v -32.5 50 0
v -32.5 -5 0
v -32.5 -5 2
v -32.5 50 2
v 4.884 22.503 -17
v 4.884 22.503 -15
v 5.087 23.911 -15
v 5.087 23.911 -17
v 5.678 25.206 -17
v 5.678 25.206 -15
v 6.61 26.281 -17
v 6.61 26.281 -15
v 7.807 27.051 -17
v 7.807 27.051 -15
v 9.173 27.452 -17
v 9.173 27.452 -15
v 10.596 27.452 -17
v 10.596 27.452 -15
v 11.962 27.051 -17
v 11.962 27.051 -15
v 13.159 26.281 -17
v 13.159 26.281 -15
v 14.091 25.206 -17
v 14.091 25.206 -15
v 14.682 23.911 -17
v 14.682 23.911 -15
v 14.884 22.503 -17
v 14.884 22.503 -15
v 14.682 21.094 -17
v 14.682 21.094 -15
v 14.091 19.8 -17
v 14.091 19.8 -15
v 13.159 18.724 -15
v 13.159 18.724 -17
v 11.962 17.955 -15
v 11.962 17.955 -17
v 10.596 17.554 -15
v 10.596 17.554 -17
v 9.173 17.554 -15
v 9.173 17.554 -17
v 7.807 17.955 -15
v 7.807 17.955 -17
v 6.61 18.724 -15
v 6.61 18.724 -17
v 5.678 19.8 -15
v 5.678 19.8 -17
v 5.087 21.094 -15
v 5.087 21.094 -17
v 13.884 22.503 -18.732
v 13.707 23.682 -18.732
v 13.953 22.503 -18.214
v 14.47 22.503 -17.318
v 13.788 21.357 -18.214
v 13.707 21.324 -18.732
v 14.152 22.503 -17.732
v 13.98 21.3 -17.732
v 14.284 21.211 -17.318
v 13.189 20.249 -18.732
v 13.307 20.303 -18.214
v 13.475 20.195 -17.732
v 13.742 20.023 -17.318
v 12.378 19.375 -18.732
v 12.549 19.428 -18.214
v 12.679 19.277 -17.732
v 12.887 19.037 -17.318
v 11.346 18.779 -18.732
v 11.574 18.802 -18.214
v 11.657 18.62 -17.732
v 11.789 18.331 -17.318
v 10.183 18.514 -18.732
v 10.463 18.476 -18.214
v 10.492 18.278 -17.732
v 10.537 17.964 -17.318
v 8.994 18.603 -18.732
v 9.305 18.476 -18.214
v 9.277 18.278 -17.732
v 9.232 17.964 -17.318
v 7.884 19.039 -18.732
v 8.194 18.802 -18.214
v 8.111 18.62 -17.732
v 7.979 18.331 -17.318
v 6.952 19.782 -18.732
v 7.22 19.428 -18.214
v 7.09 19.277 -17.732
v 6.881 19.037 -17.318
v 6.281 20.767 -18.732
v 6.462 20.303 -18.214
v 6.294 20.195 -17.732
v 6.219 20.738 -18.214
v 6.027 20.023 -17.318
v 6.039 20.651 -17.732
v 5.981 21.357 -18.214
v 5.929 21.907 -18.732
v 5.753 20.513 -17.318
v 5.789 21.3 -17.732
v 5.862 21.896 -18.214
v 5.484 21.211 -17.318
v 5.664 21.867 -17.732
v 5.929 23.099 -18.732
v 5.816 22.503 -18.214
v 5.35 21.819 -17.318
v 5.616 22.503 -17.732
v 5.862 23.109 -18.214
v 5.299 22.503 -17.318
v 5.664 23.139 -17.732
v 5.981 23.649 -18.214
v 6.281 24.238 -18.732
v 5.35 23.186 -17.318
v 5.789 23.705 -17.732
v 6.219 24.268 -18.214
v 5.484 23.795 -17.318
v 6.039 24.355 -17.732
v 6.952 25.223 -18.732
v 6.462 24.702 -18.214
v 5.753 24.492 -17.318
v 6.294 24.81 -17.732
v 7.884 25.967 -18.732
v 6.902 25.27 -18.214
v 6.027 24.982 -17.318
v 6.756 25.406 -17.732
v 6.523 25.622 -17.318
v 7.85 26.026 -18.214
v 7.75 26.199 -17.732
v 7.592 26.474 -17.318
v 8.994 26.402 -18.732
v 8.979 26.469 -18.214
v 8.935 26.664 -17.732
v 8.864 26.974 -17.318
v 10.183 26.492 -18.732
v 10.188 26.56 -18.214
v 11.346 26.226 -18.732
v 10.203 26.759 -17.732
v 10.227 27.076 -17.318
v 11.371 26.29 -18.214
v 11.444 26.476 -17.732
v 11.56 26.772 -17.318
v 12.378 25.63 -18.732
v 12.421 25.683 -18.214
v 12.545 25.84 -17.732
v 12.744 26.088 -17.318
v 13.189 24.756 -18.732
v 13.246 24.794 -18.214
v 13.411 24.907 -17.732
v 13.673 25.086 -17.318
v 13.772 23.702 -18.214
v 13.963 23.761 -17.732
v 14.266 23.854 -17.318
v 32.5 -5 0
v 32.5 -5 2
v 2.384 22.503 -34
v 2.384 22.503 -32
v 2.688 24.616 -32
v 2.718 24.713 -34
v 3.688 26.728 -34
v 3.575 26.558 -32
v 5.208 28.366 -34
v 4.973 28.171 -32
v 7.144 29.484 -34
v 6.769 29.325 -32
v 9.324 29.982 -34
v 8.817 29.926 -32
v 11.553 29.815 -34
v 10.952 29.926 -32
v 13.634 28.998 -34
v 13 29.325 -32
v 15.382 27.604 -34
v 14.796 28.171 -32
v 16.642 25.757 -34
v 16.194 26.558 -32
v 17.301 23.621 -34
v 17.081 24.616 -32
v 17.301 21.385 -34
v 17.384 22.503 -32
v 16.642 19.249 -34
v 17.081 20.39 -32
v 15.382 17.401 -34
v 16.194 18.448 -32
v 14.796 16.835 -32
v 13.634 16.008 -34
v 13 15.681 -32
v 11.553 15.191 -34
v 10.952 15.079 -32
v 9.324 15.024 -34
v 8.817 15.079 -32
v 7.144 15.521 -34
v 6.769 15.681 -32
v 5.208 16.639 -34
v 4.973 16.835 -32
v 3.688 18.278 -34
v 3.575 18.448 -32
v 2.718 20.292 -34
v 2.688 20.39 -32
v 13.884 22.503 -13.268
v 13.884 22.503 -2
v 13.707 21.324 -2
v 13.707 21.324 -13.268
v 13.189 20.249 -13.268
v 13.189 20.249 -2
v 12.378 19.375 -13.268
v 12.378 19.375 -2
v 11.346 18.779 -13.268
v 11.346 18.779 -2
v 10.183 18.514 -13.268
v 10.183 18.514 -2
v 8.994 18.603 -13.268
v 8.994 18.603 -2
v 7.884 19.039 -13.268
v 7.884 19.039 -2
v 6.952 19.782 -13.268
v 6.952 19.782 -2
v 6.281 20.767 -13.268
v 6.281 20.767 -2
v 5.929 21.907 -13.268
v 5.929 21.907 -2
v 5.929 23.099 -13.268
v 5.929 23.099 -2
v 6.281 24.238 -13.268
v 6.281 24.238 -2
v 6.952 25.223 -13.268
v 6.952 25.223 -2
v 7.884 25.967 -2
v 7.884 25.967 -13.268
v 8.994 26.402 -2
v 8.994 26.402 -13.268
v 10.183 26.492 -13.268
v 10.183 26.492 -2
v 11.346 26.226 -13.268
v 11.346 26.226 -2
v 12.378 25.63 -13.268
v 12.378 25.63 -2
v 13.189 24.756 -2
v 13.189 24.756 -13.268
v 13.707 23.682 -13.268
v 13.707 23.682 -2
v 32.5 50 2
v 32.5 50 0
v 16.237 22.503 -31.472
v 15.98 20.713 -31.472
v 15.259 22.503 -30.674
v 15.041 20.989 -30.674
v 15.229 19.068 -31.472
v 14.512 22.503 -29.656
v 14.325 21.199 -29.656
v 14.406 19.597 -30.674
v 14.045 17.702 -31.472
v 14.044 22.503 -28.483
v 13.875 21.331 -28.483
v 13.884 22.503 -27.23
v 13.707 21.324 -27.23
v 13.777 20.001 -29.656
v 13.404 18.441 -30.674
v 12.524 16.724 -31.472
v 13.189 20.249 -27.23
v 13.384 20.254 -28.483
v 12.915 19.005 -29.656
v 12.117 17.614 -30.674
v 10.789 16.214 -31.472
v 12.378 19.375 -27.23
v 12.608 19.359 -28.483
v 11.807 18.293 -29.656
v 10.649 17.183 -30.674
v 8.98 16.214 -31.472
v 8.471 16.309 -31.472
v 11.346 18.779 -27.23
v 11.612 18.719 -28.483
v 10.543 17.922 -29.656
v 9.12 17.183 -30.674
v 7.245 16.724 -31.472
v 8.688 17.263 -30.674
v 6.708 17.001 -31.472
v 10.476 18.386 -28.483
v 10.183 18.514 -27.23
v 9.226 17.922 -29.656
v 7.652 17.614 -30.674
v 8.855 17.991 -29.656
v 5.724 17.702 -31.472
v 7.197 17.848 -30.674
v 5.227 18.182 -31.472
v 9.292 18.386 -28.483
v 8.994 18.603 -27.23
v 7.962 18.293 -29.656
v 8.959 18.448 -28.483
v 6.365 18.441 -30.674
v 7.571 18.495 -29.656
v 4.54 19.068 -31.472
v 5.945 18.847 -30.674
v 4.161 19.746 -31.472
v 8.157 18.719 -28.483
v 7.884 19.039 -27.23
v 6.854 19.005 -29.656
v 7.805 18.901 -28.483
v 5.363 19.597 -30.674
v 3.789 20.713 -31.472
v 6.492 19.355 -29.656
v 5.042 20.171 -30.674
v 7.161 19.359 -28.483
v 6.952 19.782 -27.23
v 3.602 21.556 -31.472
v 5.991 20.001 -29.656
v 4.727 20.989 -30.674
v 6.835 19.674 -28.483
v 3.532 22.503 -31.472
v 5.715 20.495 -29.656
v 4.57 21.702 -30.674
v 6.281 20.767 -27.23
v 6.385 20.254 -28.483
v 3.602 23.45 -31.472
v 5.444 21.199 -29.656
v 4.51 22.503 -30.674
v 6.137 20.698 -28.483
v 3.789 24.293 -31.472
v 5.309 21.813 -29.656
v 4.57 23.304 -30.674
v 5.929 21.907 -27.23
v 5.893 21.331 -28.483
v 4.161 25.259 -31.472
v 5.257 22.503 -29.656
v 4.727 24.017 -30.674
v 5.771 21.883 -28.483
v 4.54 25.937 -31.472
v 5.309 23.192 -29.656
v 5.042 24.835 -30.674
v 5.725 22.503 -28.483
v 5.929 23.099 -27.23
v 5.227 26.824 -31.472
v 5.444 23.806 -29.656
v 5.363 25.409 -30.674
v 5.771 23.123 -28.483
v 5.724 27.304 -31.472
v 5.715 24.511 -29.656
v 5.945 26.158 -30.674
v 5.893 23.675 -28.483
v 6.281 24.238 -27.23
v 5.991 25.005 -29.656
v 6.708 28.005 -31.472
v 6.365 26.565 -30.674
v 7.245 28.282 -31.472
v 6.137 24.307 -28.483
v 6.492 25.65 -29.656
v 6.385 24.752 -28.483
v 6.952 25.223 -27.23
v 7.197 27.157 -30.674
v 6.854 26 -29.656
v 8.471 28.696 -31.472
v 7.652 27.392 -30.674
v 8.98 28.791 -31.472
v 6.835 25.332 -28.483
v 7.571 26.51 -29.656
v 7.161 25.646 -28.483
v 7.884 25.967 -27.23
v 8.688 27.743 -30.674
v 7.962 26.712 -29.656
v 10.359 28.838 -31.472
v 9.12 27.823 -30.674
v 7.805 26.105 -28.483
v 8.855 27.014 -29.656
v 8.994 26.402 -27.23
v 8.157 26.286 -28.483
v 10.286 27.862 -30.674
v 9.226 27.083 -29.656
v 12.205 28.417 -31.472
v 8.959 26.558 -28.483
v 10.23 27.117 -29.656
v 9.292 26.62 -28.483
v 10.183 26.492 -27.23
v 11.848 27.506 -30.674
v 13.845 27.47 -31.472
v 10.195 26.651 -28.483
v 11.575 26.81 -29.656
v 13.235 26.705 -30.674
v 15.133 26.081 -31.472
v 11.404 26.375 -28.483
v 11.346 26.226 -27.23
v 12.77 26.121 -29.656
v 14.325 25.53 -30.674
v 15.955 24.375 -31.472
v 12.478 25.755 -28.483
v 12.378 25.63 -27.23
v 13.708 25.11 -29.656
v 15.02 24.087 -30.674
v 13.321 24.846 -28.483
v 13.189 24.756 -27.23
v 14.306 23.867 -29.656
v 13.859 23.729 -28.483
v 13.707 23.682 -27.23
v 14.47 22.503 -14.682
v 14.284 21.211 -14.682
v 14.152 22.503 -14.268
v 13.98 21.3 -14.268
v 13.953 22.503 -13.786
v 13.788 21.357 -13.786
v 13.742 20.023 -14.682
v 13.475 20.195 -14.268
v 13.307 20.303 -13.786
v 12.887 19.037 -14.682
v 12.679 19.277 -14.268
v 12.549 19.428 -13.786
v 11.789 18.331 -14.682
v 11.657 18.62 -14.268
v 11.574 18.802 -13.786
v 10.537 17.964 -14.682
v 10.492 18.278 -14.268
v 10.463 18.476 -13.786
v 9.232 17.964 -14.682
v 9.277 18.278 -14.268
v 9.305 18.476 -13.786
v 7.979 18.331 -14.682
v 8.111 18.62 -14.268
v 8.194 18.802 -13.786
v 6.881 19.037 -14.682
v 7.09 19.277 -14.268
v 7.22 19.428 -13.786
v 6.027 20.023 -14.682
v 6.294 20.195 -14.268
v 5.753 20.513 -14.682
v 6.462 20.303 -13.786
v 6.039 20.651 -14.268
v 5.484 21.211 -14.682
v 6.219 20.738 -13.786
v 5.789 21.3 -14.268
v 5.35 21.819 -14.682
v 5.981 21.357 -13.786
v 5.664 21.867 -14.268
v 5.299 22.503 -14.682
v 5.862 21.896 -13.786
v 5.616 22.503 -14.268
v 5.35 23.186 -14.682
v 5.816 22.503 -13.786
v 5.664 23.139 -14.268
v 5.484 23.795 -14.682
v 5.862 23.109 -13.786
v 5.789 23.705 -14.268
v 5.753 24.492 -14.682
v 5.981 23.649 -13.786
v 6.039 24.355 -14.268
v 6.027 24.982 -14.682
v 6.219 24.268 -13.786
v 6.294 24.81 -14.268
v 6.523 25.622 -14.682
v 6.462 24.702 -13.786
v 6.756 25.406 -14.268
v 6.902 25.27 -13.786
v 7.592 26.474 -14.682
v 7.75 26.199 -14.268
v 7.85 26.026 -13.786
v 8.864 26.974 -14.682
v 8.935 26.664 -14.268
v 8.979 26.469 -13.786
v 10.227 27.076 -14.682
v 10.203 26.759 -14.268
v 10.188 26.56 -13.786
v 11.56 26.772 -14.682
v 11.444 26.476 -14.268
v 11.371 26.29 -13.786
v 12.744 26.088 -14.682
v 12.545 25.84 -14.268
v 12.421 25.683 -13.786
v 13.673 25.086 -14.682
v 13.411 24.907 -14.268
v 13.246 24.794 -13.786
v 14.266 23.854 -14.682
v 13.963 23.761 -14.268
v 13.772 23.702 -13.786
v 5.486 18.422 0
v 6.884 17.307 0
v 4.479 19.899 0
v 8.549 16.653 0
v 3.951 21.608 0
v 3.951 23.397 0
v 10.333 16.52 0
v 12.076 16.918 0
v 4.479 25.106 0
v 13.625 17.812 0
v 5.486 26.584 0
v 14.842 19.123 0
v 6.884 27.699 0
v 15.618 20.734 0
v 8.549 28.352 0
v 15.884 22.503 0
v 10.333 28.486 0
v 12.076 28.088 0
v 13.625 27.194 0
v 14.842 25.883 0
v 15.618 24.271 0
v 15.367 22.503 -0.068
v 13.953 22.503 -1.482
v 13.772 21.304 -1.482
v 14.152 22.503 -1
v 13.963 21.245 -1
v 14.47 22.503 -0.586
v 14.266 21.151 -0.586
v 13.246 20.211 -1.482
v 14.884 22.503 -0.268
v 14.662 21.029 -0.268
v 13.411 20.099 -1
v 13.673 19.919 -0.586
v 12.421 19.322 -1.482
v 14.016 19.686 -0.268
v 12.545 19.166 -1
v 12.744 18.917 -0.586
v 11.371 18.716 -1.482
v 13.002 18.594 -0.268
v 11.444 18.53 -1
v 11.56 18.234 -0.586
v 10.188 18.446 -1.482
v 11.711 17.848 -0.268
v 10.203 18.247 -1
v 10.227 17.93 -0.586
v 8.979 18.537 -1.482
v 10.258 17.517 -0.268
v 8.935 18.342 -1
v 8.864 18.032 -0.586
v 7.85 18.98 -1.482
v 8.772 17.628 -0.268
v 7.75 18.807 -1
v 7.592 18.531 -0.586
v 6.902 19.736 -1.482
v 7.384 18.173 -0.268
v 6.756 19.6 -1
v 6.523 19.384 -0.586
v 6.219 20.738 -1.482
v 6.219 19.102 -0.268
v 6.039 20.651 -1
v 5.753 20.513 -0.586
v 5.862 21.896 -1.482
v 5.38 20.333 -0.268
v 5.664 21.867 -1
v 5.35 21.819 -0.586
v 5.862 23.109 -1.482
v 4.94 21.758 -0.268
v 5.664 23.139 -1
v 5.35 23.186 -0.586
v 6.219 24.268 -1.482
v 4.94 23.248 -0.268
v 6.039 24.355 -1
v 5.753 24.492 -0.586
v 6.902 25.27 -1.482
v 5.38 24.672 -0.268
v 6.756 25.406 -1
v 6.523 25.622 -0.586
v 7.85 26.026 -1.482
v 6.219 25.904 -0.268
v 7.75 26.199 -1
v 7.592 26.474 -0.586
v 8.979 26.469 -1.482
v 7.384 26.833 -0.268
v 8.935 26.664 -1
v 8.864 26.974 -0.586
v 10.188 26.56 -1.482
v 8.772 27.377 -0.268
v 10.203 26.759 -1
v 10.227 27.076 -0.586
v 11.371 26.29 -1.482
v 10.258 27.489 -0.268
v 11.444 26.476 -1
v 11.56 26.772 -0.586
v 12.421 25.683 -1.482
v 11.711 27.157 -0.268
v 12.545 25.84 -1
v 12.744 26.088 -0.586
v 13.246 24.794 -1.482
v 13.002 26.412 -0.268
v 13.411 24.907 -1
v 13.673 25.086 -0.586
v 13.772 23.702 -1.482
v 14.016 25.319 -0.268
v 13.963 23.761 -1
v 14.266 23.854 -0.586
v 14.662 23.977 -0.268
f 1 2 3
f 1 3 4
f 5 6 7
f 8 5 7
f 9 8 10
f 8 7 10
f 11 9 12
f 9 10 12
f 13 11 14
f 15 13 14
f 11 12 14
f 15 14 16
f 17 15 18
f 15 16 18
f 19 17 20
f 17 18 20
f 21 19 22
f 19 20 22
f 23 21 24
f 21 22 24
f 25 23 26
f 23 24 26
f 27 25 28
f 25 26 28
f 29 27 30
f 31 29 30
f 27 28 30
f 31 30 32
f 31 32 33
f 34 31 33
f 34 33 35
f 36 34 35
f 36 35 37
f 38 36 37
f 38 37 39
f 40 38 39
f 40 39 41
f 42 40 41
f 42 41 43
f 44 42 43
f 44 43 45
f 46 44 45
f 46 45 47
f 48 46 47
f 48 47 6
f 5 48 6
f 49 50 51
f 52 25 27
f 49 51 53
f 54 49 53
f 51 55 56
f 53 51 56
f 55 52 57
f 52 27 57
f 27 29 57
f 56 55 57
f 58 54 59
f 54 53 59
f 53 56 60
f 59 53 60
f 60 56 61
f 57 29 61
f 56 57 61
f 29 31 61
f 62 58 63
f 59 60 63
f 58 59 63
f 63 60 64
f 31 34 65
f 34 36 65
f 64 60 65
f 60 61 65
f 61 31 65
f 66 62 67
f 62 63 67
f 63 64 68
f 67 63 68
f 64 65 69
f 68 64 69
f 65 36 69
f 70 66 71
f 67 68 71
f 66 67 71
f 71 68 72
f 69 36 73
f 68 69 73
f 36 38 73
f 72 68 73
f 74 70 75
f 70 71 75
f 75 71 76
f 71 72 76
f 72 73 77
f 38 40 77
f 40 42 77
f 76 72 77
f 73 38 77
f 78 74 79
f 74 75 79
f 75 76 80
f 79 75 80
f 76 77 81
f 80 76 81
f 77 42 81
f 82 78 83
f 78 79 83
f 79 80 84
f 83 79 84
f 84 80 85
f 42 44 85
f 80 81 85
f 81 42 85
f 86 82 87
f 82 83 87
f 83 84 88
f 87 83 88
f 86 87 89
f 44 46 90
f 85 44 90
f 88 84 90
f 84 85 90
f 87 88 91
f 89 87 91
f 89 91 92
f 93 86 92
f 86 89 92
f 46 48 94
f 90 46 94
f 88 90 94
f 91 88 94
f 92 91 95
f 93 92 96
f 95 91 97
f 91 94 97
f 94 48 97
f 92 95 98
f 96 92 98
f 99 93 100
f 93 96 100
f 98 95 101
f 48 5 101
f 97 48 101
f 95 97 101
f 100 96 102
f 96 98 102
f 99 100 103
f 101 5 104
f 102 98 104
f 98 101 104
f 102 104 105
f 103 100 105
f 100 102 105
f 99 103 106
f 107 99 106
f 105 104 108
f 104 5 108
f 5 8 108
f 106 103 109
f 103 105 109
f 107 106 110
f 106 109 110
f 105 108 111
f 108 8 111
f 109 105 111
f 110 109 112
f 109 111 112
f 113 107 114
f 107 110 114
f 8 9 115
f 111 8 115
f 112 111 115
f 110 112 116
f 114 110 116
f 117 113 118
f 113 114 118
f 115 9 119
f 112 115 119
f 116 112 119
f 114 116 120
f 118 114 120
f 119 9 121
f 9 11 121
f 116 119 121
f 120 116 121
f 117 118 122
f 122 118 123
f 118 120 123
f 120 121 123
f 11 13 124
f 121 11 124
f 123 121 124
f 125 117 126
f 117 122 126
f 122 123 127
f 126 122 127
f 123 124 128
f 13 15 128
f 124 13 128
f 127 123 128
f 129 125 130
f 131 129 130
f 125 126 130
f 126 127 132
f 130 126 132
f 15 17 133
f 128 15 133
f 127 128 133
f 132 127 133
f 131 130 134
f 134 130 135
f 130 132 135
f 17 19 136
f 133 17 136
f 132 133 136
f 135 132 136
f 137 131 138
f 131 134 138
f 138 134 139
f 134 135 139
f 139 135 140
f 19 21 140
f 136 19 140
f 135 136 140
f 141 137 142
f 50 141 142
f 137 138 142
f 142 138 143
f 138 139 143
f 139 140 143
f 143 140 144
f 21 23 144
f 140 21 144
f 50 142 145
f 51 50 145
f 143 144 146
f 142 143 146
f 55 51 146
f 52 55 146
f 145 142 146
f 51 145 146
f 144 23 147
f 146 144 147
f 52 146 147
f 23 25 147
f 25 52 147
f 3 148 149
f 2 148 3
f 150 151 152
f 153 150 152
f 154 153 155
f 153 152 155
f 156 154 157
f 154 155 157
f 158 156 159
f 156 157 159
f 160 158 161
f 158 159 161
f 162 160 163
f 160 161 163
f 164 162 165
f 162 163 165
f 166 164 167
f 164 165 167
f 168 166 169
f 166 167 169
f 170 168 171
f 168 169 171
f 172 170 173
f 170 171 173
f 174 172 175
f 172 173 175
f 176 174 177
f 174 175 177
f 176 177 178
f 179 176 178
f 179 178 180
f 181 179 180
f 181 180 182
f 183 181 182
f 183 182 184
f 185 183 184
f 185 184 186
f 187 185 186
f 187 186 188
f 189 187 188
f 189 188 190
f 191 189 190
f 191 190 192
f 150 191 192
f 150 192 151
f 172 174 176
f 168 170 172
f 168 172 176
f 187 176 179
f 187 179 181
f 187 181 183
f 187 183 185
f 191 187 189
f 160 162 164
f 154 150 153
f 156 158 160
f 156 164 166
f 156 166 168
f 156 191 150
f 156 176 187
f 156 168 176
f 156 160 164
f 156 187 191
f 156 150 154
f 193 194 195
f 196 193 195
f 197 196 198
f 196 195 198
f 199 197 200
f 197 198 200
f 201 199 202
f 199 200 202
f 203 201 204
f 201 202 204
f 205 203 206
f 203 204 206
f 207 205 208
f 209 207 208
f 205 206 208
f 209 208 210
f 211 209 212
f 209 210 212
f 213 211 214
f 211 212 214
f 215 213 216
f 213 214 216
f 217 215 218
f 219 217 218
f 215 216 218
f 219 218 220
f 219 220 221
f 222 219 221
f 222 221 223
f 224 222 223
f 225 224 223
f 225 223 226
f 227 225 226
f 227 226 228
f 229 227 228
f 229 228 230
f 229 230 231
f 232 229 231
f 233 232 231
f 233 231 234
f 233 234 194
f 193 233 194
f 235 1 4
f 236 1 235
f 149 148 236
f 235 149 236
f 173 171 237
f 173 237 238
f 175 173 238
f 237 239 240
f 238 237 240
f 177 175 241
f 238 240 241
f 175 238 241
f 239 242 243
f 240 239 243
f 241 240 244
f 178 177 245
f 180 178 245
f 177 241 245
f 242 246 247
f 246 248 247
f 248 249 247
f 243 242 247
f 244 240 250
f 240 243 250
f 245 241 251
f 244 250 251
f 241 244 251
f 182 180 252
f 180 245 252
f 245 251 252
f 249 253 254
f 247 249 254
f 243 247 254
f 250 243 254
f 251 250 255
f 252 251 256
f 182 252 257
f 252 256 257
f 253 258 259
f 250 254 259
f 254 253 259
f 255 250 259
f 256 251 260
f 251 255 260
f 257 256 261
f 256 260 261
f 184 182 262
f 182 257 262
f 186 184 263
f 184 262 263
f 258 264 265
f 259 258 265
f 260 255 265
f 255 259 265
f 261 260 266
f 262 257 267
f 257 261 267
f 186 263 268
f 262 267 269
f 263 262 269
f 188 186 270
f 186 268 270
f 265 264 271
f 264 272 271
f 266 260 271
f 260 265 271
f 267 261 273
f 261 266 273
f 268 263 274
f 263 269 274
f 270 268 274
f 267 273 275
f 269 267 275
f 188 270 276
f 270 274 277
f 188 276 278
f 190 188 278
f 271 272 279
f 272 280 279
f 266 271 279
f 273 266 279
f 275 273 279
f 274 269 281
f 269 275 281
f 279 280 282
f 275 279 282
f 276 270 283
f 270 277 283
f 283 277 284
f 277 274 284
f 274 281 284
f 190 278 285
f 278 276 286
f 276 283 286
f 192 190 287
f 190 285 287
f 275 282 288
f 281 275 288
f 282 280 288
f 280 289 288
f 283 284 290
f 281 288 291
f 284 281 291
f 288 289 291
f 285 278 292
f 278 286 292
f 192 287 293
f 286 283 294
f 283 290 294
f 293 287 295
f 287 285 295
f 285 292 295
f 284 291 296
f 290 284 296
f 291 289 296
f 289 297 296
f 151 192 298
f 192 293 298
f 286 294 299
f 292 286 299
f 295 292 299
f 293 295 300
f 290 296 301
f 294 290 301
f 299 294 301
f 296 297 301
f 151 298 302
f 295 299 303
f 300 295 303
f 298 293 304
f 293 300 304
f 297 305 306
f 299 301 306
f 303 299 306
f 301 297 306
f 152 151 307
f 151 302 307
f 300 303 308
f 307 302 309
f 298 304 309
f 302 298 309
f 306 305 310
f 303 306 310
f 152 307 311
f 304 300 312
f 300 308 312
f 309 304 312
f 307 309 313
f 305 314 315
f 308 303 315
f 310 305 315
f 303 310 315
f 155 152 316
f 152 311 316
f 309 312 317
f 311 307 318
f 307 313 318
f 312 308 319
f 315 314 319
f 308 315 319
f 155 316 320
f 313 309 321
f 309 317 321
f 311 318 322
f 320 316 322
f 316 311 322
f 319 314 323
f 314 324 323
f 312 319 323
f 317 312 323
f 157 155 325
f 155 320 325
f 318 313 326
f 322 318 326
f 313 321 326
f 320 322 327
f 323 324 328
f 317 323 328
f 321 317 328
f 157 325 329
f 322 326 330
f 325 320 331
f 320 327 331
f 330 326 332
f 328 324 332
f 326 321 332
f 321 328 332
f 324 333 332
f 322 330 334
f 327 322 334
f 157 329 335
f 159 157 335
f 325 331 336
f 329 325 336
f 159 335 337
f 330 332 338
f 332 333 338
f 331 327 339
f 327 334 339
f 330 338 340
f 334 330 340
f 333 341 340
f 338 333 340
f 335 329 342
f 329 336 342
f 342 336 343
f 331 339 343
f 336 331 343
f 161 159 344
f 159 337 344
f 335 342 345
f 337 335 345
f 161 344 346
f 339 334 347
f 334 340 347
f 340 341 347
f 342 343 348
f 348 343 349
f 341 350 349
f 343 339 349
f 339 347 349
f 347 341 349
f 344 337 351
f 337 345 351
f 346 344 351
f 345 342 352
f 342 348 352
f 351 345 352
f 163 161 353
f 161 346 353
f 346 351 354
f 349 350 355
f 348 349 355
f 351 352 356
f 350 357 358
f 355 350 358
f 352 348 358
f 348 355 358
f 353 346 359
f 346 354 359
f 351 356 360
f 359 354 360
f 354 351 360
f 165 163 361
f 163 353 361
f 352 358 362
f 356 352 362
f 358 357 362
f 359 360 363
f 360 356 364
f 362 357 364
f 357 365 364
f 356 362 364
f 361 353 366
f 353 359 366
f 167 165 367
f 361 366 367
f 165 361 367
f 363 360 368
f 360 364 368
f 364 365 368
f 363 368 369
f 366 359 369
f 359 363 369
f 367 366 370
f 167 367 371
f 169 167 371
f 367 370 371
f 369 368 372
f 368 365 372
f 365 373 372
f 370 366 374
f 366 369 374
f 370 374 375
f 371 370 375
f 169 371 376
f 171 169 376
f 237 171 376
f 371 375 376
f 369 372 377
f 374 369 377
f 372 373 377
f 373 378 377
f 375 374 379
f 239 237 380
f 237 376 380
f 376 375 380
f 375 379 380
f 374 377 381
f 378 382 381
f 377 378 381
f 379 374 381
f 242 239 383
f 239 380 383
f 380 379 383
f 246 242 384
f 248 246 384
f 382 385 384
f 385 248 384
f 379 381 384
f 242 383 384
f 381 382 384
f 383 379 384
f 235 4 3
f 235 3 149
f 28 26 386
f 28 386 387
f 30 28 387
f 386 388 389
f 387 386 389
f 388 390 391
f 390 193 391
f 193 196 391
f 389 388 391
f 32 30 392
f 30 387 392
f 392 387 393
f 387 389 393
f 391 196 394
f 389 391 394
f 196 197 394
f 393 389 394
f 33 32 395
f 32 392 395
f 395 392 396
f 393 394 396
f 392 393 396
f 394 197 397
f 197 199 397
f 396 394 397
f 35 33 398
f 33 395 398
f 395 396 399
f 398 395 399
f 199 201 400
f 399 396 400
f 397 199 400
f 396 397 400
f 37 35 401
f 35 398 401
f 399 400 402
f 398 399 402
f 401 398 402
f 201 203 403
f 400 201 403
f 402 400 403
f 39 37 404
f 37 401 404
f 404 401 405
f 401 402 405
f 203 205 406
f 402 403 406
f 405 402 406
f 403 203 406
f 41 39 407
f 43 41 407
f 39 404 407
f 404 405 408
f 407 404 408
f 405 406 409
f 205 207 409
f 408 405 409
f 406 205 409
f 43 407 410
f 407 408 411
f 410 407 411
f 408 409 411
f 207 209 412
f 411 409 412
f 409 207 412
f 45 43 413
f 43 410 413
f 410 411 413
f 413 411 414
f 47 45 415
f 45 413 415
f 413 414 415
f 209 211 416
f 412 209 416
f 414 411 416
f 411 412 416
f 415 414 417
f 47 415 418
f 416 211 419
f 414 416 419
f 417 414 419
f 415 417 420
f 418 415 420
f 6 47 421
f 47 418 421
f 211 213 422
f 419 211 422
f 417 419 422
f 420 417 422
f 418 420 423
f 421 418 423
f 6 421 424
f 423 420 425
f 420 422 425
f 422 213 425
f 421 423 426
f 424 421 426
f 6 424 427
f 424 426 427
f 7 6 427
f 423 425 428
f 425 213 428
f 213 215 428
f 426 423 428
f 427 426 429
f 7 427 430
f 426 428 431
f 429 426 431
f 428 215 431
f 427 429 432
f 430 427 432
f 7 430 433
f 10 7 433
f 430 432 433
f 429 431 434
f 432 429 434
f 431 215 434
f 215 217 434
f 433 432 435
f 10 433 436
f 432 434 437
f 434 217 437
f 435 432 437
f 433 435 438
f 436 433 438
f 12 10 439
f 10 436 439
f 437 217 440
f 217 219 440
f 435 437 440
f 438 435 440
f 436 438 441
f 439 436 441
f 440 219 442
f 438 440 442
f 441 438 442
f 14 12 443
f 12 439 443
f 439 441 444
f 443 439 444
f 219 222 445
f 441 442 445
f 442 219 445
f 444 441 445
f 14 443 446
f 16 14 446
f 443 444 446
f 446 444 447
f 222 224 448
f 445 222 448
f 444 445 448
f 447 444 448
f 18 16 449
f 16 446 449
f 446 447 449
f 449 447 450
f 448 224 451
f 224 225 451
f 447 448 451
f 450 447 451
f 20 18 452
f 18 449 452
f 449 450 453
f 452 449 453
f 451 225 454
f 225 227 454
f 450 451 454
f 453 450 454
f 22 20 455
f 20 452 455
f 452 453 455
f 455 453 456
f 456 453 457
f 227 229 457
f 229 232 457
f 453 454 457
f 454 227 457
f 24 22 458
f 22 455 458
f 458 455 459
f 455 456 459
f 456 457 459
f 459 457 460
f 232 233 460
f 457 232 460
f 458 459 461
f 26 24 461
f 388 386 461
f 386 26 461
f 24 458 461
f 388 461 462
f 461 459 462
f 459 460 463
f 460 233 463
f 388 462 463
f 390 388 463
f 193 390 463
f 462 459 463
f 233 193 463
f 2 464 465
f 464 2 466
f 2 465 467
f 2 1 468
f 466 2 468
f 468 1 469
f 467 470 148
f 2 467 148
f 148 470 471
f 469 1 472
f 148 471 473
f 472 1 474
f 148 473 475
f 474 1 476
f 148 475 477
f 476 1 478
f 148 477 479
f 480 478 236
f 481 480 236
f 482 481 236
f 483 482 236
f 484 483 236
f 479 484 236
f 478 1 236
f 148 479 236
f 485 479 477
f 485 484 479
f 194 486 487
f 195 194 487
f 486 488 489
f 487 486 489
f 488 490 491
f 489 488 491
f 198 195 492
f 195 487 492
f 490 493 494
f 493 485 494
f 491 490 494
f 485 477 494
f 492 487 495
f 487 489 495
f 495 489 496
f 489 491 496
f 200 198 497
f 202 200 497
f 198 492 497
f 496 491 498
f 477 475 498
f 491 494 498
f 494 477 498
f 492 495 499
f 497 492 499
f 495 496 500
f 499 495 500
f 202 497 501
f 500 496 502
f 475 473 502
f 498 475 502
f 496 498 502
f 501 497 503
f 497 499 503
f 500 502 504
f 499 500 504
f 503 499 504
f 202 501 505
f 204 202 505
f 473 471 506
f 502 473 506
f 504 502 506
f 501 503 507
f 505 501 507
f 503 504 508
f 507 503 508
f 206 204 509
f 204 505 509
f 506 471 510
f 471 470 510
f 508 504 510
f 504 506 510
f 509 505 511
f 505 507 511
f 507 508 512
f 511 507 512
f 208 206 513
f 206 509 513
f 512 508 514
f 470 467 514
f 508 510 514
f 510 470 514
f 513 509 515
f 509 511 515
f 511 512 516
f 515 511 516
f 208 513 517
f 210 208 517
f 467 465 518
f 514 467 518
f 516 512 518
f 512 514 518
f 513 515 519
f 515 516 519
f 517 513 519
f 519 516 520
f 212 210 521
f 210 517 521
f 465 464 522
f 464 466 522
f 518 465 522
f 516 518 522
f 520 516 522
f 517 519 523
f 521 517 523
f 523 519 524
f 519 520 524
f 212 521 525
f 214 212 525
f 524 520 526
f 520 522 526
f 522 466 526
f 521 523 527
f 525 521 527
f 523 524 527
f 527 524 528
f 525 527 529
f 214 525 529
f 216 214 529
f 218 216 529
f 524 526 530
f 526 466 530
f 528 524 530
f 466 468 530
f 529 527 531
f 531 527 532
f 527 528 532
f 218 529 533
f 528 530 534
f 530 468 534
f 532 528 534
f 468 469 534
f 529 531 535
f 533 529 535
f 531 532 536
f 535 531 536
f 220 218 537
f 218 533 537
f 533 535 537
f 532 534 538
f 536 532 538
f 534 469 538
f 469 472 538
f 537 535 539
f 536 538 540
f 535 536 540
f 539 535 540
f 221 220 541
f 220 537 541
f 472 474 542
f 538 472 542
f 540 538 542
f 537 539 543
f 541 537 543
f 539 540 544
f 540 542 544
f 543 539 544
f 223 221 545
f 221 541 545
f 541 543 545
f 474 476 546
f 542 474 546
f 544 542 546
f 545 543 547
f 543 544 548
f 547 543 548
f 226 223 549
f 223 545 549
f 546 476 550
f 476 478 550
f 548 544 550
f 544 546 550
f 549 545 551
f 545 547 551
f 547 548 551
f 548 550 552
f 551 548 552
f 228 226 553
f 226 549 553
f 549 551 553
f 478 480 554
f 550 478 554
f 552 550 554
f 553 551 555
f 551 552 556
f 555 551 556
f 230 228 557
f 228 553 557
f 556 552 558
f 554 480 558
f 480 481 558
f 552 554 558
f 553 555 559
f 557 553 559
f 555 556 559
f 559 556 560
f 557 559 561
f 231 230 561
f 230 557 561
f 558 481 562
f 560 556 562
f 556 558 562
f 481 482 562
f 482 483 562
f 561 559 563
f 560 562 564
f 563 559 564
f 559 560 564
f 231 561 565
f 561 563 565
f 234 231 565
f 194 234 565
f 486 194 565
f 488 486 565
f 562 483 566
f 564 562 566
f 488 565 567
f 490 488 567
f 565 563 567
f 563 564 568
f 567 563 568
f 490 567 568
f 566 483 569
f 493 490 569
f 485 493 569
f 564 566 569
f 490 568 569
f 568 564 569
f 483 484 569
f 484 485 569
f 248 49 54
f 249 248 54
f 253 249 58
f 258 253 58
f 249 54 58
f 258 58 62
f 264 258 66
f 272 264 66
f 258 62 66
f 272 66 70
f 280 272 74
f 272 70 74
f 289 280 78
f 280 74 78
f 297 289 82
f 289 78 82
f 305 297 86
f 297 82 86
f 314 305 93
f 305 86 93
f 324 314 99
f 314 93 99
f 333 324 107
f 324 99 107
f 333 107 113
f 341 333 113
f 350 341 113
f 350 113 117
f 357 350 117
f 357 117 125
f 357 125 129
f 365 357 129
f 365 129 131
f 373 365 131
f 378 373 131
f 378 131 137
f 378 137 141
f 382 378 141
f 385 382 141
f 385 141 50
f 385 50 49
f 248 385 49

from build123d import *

# Parameters (mm, degrees)
SKIZZE2_W                       = 65
SKIZZE2_H                       = 100
AUFSATZ_LINEAR_AUSTRAGEN1_DEPTH = 2
SKIZZE3_R                       = 4
AUFSATZ_LINEAR_AUSTRAGEN2_DEPTH = 15
SKIZZE4_R                       = 5
AUFSATZ_LINEAR_AUSTRAGEN3_DEPTH = 2
SKIZZE5_R                       = 4
AUFSATZ_LINEAR_AUSTRAGEN4_DEPTH = 15
SKIZZE6_R                       = 7.5
AUFSATZ_LINEAR_AUSTRAGEN5_DEPTH = 2
VERRUNDUNG1_R                   = 2
VERRUNDUNG2_R                   = 2
VERRUNDUNG3_R                   = 5
SKIZZE7_W                       = 65
SKIZZE7_H                       = 45
SCHNITT_LINEAR_AUSTRAGEN1_DEPTH = 2
VERRUNDUNG4_R                   = 2


with BuildPart() as part:
    # Skizze2 → Aufsatz-Linear austragen1 (new body)
    with BuildSketch(Plane.XY):
        Rectangle(SKIZZE2_W, SKIZZE2_H)
    extrude(amount=AUFSATZ_LINEAR_AUSTRAGEN1_DEPTH)

    # Skizze3 → Aufsatz-Linear austragen2 (add)
    with BuildSketch(Plane(origin=(9.884440789, -5.646814133, 0), x_dir=(-1, 0, 0), z_dir=(0, 0, -1))):
        with Locations(Location((0, 28.149559508, 0), (0, 0, 180))):
            Circle(SKIZZE3_R)
    extrude(amount=AUFSATZ_LINEAR_AUSTRAGEN2_DEPTH)

    # Skizze4 → Aufsatz-Linear austragen3 (add)
    with BuildSketch(Plane(origin=(9.884440789, -5.646814133, -15), x_dir=(-1, 0, 0), z_dir=(0, 0, -1))):
        with Locations((0, 28.149559508)):
            Circle(SKIZZE4_R)
    extrude(amount=AUFSATZ_LINEAR_AUSTRAGEN3_DEPTH)

    # Skizze5 → Aufsatz-Linear austragen4 (add)
    with BuildSketch(Plane(origin=(9.884440789, -5.646814133, -17), x_dir=(-1, 0, 0), z_dir=(0, 0, -1))):
        with Locations(Location((0, 28.149559508, 0), (0, 0, 180))):
            Circle(SKIZZE5_R)
    extrude(amount=AUFSATZ_LINEAR_AUSTRAGEN4_DEPTH)

    # Skizze6 → Aufsatz-Linear austragen5 (add)
    with BuildSketch(Plane(origin=(9.884440789, -5.646814133, -32), x_dir=(-1, 0, 0), z_dir=(0, 0, -1))):
        with Locations((0, 28.149559508)):
            Circle(SKIZZE6_R)
    extrude(amount=AUFSATZ_LINEAR_AUSTRAGEN5_DEPTH)

    # Verrundung1
    # the kernel refuses this fillet: 2 mm, written as the material it adds along each edge
    with BuildSketch(Plane(origin=(9.884440789, 22.502745375, -15), x_dir=(1, 0, 0), z_dir=(0, 1, 0))) as verrundung1_piece_1:
        with BuildLine():
            CenterArc((6, -1.732050808), VERRUNDUNG1_R, 120, 60)
            Line((4, -1.732050808), (3.96, -1.732050808))
            Line((3.96, -1.732050808), (3.96, 0))
            Line((3.96, 0), (4, 0.04))
            ThreePointArc((4, 0.04), (4.5, 0.04), (4.98, 0.034641016))
            Line((4.98, 0.034641016), (5, 0))
        make_face()
    revolve(axis=Axis((9.884440789, 22.502745375, -15), (0, 0, -1)))

    # Verrundung2
    # the kernel refuses this fillet: 2 mm, written as the material it adds along each edge
    with BuildSketch(Plane(origin=(9.884440789, 22.502745375, -17), x_dir=(1, 0, 0), z_dir=(0, 1, 0))) as verrundung2_piece_1:
        with BuildLine():
            CenterArc((6, 1.732050808), VERRUNDUNG2_R, 180, 60)
            Line((4, 1.732050808), (3.96, 1.732050808))
            Line((3.96, 1.732050808), (3.96, 0))
            Line((3.96, 0), (4, -0.04))
            ThreePointArc((4, -0.04), (4.5, -0.04), (4.98, -0.034641016))
            Line((4.98, -0.034641016), (5, 0))
        make_face()
    revolve(axis=Axis((9.884440789, 22.502745375, -17), (0, 0, -1)))

    # Verrundung3
    # the kernel refuses this fillet: 5 mm, written as the material it adds along each edge
    with BuildSketch(Plane(origin=(9.884440789, 22.502745375, -32), x_dir=(1, 0, 0), z_dir=(0, 1, 0))) as verrundung3_piece_1:
        with BuildLine():
            CenterArc((9, -4.769696007), VERRUNDUNG3_R, 107.457603124, 72.542396876)
            Line((7.5, 0), (7.47, 0.09539392))
            ThreePointArc((7.47, 0.09539392), (5.75, 0.1), (4, 0.1))
            Line((4, 0.1), (3.9, 0))
            Line((3.9, 0), (3.9, -4.769696007))
            Line((3.9, -4.769696007), (4, -4.769696007))
        make_face()
    revolve(axis=Axis((9.884440789, 22.502745375, -32), (0, 0, -1)))

    # Skizze7 → Schnitt-Linear austragen1 (cut)
    with BuildSketch(Plane(origin=(0, 0, 0), x_dir=(-1, 0, 0), z_dir=(0, 0, -1))):
        with Locations((0, -27.5)):
            Rectangle(SKIZZE7_W, SKIZZE7_H)
    extrude(amount=-SCHNITT_LINEAR_AUSTRAGEN1_DEPTH, mode=Mode.SUBTRACT)

    # Verrundung4
    verrundung4_edges = [part.edges().sort_by_distance(p)[0] for p in [
        (5.884440789, 22.502745375, 0),
    ]]
    fillet(verrundung4_edges, radius=VERRUNDUNG4_R)


solid = part.part
